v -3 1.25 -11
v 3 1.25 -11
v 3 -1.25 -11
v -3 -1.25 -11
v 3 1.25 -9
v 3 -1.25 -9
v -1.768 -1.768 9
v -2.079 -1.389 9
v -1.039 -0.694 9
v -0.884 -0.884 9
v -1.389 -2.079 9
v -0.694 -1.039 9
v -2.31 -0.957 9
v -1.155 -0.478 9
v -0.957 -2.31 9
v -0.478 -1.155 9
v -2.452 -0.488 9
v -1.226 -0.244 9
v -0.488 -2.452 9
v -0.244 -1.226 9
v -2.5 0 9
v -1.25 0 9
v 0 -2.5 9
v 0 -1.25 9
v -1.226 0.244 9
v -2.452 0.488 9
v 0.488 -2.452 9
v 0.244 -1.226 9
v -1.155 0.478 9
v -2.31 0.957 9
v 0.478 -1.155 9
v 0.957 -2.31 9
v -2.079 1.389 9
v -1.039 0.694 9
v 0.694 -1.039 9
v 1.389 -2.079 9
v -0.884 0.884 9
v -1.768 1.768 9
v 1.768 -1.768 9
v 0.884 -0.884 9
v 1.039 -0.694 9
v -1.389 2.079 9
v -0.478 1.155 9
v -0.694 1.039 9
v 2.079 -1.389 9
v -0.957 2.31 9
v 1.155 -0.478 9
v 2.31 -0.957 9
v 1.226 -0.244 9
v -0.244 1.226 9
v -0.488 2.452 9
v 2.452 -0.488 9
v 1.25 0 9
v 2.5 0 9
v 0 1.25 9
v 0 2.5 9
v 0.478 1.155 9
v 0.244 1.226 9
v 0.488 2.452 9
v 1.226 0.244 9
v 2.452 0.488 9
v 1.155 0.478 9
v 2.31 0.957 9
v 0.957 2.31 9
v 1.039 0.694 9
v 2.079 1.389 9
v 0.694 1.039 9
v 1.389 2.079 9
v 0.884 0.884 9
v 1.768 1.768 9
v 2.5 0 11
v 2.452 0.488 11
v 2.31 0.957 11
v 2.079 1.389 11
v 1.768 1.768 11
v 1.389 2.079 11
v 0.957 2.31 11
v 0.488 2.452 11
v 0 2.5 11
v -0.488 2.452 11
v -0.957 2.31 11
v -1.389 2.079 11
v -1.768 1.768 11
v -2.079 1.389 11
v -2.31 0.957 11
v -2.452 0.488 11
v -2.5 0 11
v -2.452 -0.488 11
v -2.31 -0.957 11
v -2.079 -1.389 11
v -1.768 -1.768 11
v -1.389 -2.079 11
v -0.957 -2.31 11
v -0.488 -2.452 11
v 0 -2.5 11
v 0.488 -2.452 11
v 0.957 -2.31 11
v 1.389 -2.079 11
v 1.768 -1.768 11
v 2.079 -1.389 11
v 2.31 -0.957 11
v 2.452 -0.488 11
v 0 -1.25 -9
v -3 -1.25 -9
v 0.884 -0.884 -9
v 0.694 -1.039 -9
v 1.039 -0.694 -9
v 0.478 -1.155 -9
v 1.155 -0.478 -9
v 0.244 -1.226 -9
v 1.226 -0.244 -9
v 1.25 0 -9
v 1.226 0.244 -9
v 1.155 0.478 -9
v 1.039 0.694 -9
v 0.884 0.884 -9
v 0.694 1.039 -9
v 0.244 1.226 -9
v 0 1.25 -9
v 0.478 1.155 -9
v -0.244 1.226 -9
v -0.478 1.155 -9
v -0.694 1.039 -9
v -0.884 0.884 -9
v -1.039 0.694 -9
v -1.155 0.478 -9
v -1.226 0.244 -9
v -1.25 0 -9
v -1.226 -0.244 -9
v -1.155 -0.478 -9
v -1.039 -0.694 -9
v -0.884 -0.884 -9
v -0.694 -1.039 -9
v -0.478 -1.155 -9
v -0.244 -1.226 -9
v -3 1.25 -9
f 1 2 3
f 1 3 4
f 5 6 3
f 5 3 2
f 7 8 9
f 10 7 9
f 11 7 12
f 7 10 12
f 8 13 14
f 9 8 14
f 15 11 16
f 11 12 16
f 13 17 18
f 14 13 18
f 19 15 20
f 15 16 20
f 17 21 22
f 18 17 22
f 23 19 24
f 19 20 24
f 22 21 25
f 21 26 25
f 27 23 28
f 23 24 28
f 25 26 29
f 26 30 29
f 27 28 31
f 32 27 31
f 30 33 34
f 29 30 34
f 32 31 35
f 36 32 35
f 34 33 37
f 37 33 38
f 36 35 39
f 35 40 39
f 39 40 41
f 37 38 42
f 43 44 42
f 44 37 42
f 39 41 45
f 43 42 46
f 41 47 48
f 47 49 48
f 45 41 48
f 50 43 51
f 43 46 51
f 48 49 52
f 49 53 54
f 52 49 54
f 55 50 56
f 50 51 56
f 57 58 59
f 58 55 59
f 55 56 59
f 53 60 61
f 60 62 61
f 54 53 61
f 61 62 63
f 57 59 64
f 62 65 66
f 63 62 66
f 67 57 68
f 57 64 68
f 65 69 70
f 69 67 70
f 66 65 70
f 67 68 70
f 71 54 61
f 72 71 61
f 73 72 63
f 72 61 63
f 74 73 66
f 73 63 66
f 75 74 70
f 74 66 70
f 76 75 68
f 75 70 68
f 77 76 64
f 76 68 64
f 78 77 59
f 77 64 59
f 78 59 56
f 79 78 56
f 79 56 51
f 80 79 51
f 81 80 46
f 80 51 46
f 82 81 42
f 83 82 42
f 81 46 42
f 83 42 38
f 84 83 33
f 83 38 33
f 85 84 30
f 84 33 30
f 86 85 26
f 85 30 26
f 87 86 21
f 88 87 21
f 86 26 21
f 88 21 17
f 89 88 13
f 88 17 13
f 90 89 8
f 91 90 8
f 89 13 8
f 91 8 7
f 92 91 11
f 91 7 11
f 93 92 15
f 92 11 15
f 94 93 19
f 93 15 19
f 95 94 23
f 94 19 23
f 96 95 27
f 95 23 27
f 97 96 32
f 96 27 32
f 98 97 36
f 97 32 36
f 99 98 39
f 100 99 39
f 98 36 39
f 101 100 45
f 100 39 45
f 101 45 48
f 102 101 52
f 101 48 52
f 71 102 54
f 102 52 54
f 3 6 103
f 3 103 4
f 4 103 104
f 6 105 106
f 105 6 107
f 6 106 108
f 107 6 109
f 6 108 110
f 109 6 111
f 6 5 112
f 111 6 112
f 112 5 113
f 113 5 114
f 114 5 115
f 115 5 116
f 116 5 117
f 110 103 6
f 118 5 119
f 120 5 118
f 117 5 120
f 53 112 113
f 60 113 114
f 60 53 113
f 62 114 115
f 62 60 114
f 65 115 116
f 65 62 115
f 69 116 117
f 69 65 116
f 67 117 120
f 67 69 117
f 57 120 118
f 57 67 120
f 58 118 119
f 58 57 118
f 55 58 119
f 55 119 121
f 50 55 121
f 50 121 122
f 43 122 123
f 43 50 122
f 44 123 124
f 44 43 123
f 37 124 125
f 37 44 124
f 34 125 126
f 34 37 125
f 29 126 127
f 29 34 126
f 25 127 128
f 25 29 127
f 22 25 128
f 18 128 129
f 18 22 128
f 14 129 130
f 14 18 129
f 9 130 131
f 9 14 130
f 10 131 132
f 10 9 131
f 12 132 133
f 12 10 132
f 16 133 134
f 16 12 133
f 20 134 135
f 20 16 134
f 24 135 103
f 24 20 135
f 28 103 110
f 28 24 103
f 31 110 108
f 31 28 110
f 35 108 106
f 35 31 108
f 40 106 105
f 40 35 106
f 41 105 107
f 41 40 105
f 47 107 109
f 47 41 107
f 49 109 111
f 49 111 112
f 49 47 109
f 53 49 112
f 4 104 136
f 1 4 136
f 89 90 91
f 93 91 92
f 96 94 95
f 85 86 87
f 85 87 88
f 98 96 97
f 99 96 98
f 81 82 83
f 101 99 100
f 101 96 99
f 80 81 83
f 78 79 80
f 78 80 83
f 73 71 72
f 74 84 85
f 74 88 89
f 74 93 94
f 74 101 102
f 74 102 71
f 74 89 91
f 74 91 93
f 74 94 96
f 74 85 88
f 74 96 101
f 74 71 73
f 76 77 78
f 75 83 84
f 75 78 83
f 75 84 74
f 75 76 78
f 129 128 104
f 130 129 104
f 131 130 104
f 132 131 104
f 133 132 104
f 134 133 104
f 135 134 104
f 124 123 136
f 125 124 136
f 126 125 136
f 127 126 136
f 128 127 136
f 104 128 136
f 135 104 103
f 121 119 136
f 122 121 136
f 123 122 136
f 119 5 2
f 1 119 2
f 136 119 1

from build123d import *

# Parameters (mm, degrees)
SKETCH1_R           = 1.25
BOSS_EXTRUDE1_DEPTH = 9
SKETCH2_R           = 2.5
BOSS_EXTRUDE2_DEPTH = 2
SKETCH3_W           = 6
SKETCH3_H           = 2.5
BOSS_EXTRUDE3_DEPTH = 2


with BuildPart() as part:
    # Sketch1 → Boss-Extrude1 (new, symmetric)
    with BuildSketch(Plane.XY):
        Circle(SKETCH1_R)
    extrude(amount=BOSS_EXTRUDE1_DEPTH, both=True)

    # Sketch2 → Boss-Extrude2 (add)
    with BuildSketch(Plane.XY.offset(9)):
        Circle(SKETCH2_R)
    extrude(amount=BOSS_EXTRUDE2_DEPTH)

    # Sketch3 → Boss-Extrude3 (add)
    with BuildSketch(Plane(origin=(0, 0, -9), x_dir=(-1, 0, 0), z_dir=(0, 0, -1))):
        Rectangle(SKETCH3_W, SKETCH3_H)
    extrude(amount=BOSS_EXTRUDE3_DEPTH)


solid = part.part
